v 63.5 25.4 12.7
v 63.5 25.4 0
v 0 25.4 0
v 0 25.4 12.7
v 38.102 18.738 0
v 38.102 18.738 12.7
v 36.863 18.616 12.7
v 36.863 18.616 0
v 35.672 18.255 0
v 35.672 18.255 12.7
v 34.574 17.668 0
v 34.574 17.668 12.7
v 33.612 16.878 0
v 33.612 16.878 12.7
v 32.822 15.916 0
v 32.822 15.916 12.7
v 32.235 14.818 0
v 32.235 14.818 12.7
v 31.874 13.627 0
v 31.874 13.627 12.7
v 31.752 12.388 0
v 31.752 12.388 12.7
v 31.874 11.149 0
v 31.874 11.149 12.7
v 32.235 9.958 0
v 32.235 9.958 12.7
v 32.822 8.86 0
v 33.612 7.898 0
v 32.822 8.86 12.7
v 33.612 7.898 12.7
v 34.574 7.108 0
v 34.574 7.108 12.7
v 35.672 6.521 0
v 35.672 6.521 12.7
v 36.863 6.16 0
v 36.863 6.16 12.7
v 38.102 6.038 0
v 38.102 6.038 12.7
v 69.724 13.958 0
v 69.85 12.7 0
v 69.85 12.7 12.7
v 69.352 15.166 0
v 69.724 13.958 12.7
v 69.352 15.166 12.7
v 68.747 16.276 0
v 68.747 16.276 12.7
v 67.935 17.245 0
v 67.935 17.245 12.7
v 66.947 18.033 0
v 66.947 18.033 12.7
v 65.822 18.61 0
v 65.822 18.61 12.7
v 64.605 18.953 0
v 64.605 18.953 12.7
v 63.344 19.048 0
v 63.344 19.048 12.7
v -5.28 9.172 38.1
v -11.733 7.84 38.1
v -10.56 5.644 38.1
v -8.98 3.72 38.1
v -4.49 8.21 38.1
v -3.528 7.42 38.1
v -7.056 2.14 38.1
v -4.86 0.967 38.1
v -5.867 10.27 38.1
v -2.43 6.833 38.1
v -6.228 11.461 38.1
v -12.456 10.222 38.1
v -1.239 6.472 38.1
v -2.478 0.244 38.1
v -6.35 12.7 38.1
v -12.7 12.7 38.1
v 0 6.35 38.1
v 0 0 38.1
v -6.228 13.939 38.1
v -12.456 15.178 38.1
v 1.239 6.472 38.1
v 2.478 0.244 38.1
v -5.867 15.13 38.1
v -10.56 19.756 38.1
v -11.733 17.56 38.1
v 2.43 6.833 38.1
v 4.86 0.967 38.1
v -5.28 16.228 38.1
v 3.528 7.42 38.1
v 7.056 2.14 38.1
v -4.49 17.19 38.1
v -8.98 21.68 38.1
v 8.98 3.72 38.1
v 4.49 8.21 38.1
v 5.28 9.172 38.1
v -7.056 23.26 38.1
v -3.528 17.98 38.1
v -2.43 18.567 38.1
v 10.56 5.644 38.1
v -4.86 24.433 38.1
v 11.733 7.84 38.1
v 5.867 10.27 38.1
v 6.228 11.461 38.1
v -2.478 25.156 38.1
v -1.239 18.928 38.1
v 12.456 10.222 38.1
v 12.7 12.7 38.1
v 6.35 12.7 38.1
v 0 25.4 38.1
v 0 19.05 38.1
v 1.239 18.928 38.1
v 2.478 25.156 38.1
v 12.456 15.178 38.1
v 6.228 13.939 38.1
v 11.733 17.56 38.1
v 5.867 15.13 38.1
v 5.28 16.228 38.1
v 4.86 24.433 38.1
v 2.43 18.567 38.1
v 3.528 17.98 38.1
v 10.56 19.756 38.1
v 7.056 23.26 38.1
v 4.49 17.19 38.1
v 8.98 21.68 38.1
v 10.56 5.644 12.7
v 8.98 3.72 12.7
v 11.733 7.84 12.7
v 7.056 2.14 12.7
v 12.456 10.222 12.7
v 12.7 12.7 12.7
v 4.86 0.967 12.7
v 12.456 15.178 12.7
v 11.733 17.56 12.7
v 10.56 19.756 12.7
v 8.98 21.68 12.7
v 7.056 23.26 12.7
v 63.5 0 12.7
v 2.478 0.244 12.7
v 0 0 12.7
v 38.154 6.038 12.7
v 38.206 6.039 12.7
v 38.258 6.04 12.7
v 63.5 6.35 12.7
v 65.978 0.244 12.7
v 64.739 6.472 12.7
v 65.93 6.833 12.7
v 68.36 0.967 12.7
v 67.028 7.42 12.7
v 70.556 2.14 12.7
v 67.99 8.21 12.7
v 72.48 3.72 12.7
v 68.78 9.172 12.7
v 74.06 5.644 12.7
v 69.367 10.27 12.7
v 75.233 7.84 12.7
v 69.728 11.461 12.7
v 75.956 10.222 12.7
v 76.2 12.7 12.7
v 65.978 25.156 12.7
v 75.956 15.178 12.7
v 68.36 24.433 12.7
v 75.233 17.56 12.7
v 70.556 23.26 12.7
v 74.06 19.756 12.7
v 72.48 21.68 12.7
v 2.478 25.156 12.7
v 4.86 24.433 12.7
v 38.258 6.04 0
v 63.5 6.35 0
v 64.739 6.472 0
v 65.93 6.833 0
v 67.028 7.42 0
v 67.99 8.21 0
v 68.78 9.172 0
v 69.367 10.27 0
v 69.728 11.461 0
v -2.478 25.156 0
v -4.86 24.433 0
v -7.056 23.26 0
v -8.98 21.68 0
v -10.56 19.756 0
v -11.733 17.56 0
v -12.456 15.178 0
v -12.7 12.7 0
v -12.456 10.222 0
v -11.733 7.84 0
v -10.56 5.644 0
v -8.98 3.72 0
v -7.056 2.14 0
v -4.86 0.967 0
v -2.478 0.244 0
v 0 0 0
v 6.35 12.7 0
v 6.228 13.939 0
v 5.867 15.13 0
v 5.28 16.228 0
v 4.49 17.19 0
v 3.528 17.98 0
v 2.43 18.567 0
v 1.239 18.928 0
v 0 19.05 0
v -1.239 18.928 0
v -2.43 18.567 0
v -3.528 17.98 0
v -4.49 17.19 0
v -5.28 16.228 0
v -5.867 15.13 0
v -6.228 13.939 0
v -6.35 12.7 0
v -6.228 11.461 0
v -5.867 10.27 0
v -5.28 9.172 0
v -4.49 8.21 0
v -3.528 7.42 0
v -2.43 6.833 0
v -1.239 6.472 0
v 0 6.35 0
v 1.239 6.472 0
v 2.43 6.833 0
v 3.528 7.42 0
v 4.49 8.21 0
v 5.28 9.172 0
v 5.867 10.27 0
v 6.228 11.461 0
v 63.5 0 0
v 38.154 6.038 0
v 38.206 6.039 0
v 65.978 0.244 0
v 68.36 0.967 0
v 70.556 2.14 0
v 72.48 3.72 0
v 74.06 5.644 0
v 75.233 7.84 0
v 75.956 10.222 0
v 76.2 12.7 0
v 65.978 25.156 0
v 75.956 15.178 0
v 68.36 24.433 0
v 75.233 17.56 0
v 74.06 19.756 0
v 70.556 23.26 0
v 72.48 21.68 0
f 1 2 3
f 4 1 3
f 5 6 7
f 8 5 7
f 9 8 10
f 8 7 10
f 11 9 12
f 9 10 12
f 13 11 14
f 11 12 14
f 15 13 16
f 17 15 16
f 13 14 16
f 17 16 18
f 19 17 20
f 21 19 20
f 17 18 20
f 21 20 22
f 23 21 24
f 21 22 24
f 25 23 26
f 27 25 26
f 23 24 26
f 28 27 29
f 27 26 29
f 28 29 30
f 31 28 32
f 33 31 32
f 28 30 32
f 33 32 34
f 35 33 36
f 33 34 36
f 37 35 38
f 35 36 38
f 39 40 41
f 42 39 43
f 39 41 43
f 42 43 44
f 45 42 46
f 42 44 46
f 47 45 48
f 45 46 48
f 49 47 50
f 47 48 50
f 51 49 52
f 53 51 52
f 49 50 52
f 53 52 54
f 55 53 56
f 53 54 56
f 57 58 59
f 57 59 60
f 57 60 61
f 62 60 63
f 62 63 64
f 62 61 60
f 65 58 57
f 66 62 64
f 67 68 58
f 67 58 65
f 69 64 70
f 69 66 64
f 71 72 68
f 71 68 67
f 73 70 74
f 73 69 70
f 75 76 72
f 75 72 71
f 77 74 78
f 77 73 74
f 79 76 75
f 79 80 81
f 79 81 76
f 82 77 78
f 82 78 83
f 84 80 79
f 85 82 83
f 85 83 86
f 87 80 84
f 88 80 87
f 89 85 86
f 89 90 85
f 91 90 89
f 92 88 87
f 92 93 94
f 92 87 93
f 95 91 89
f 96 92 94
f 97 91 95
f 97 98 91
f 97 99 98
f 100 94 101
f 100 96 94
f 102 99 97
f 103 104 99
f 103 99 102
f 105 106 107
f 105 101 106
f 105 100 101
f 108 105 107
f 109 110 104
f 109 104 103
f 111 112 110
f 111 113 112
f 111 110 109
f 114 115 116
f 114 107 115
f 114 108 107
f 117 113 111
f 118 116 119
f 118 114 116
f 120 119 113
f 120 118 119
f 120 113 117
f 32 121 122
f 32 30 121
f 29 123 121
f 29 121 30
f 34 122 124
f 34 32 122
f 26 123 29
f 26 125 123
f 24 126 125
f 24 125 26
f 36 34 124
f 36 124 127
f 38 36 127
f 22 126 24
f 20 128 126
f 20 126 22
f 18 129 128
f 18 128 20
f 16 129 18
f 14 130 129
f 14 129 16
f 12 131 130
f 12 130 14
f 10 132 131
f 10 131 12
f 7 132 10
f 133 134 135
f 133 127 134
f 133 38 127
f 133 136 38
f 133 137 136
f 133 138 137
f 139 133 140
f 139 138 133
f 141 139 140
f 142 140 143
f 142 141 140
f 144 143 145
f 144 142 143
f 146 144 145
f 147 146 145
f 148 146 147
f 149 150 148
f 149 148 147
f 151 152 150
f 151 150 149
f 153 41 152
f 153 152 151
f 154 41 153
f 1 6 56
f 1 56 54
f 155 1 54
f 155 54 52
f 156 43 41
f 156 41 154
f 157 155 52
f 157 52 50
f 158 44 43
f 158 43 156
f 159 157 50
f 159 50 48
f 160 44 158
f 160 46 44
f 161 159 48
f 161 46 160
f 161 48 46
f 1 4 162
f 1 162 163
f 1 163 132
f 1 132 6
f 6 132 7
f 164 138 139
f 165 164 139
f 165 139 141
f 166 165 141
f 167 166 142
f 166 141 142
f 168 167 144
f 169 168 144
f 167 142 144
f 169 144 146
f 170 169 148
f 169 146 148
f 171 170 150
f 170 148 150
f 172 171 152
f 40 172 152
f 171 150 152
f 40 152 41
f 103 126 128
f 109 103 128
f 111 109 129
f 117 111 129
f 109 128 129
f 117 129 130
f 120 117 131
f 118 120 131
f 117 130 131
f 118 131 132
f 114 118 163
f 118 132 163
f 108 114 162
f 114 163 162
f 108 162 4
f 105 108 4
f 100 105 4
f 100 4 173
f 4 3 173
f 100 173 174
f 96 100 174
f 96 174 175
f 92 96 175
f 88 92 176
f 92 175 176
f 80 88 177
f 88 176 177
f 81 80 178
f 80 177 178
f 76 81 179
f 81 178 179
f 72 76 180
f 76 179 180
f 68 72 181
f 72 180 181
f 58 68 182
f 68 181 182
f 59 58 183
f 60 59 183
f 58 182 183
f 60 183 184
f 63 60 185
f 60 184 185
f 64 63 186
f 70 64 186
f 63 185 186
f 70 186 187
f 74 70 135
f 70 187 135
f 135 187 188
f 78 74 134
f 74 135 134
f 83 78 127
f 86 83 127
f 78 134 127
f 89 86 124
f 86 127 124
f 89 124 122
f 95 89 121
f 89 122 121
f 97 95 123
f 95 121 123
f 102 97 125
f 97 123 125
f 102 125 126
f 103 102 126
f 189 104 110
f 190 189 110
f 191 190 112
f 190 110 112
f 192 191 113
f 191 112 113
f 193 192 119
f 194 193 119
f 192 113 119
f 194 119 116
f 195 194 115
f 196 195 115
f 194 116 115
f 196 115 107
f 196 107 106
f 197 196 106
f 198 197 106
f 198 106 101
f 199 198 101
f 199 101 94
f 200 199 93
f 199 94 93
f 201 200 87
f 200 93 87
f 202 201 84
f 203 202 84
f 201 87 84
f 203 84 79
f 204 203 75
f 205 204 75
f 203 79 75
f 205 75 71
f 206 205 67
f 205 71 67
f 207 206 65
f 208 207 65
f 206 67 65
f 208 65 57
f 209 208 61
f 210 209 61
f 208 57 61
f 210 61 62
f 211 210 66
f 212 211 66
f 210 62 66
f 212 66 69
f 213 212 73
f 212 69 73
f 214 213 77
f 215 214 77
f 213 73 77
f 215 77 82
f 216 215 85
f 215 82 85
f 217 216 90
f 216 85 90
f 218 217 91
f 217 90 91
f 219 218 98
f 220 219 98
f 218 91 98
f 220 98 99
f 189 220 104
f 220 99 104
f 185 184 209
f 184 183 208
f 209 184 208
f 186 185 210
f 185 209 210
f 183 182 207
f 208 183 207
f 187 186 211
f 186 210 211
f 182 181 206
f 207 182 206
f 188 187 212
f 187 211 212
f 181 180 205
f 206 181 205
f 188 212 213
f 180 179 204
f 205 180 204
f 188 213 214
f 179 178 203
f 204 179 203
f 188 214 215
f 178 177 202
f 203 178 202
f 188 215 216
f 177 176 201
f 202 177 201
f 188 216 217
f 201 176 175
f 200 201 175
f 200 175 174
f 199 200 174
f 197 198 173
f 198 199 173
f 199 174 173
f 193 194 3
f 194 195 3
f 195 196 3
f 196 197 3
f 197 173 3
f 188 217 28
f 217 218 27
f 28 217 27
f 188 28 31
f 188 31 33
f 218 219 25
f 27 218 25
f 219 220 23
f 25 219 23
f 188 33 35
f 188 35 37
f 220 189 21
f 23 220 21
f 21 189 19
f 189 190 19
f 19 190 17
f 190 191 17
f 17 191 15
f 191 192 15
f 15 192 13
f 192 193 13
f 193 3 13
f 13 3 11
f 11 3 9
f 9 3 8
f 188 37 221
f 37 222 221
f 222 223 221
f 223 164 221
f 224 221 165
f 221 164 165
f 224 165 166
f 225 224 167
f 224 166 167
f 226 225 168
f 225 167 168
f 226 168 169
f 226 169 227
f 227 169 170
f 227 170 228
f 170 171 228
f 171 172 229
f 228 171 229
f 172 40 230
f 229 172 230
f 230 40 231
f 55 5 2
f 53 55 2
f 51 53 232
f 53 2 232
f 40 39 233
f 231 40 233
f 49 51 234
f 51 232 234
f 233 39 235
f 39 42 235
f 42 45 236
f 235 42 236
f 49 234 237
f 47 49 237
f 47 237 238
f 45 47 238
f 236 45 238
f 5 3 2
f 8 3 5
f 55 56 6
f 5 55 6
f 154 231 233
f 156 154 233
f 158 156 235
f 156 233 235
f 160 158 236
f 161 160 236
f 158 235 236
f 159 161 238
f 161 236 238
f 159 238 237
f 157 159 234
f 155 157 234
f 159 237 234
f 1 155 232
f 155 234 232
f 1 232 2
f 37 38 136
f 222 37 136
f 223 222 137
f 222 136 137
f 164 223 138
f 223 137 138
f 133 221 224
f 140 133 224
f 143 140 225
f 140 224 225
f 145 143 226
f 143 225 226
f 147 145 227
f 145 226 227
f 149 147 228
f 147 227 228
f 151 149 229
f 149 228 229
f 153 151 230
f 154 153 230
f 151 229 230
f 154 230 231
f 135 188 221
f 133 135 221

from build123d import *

# Parameters (mm, degrees)
F1_DEPTH = 12.7
F2_R     = 12.7
F3_DEPTH = 25.4
F4_R     = 6.35
F5_DEPTH = 38.1
F7_DEPTH = 12.7


with BuildPart() as f1:
    # F0 (on Top) → F1 (new body)
    with BuildSketch(Plane.XY):
        with BuildLine():
            ThreePointArc((0, 25.4), (-12.7, 12.7), (0, 0))
            Line((0, 0), (0, 25.4))
        make_face()
        with BuildLine():
            ThreePointArc((12.7, 12.7), (8.9802561211, 3.7197438789), (0, 0))
            Line((0, 0), (63.5, 0))
            ThreePointArc((63.5, 0), (50.8, 12.7), (63.5, 25.4))
            Line((63.5, 25.4), (0, 25.4))
            ThreePointArc((0, 25.4), (8.9802561211, 21.6802561211), (12.7, 12.7))
        make_face()
        with BuildLine():
            Line((0, 25.4), (0, 0))
            ThreePointArc((0, 0), (8.9802561211, 3.7197438789), (12.7, 12.7))
            ThreePointArc((12.7, 12.7), (8.9802561211, 21.6802561211), (0, 25.4))
        make_face()
        with BuildLine():
            ThreePointArc((63.5, 25.4), (50.8, 12.7), (63.5, 0))
            Line((63.5, 0), (63.5, 25.4))
        make_face()
        with BuildLine():
            Line((63.5, 25.4), (63.5, 0))
            ThreePointArc((63.5, 0), (72.4802561211, 3.7197438789), (76.2, 12.7))
            ThreePointArc((76.2, 12.7), (72.4802561211, 21.6802561211), (63.5, 25.4))
        make_face()
    extrude(amount=F1_DEPTH)

    # F2 (on face) → F3 (join)
    with BuildSketch(Plane.XY.offset(12.7)):
        with Locations((0, 12.7)):
            Circle(F2_R)
    extrude(amount=F3_DEPTH)

    # F4 (on face) → F5 (cut)
    with BuildSketch(Plane.XY.offset(38.1)):
        with Locations((0, 12.7)):
            Circle(F4_R)
    extrude(amount=-F5_DEPTH, mode=Mode.SUBTRACT)

    # F6 (on face) → F7 (cut)
    with BuildSketch(Plane.XY.offset(12.7)):
        with BuildLine():
            ThreePointArc((38.257622641, 6.0399938281), (42.6467607914, 7.9533489918), (44.4519152548, 12.3880845024))
            ThreePointArc((44.4519152548, 12.3880845024), (42.5920433154, 16.878212563), (38.1019152548, 18.7380845024))
            Line((38.1019152548, 18.7380845024), (38.1019152548, 6.0380845024))
            Line((38.1019152548, 6.0380845024), (38.257622641, 6.0399938281))
        make_face()
        with BuildLine():
            ThreePointArc((38.1019152548, 18.7380845024), (42.5920433154, 16.878212563), (44.4519152548, 12.3880845024))
            ThreePointArc((44.4519152548, 12.3880845024), (42.6467607914, 7.9533489918), (38.257622641, 6.0399938281))
            Line((38.257622641, 6.0399938281), (63.5, 6.3495226148))
            Line((63.5, 6.3495226148), (63.4999941462, 6.35))
            ThreePointArc((63.4999941462, 6.35), (57.1504773494, 12.622140454), (63.3442867618, 19.0480905308))
            Line((63.3442867618, 19.0480905308), (38.1019152548, 18.7380845024))
        make_face()
        with BuildLine():
            Line((38.1019152548, 6.0380845024), (38.1019152548, 18.7380845024))
            ThreePointArc((38.1019152548, 18.7380845024), (31.7519152548, 12.3880845024), (38.1019152548, 6.0380845024))
        make_face()
        with BuildLine():
            ThreePointArc((38.1019152548, 6.0380845024), (38.1797748009, 6.0385618518), (38.257622641, 6.0399938281))
            Line((38.257622641, 6.0399938281), (38.1019152548, 6.0380845024))
        make_face()
        with BuildLine():
            Line((63.4999941462, 6.35), (63.3442867618, 19.0480905308))
            ThreePointArc((63.3442867618, 19.0480905308), (57.1504773494, 12.622140454), (63.4999941462, 6.35))
        make_face()
        with BuildLine():
            ThreePointArc((69.85, 12.7), (67.9347334157, 17.2448475807), (63.3442867618, 19.0480905308))
            Line((63.3442867618, 19.0480905308), (63.4999941462, 6.35))
            ThreePointArc((63.4999941462, 6.35), (67.9901259909, 8.2098698698), (69.85, 12.7))
        make_face()
    extrude(amount=-F7_DEPTH, mode=Mode.SUBTRACT)


solid = f1.part
